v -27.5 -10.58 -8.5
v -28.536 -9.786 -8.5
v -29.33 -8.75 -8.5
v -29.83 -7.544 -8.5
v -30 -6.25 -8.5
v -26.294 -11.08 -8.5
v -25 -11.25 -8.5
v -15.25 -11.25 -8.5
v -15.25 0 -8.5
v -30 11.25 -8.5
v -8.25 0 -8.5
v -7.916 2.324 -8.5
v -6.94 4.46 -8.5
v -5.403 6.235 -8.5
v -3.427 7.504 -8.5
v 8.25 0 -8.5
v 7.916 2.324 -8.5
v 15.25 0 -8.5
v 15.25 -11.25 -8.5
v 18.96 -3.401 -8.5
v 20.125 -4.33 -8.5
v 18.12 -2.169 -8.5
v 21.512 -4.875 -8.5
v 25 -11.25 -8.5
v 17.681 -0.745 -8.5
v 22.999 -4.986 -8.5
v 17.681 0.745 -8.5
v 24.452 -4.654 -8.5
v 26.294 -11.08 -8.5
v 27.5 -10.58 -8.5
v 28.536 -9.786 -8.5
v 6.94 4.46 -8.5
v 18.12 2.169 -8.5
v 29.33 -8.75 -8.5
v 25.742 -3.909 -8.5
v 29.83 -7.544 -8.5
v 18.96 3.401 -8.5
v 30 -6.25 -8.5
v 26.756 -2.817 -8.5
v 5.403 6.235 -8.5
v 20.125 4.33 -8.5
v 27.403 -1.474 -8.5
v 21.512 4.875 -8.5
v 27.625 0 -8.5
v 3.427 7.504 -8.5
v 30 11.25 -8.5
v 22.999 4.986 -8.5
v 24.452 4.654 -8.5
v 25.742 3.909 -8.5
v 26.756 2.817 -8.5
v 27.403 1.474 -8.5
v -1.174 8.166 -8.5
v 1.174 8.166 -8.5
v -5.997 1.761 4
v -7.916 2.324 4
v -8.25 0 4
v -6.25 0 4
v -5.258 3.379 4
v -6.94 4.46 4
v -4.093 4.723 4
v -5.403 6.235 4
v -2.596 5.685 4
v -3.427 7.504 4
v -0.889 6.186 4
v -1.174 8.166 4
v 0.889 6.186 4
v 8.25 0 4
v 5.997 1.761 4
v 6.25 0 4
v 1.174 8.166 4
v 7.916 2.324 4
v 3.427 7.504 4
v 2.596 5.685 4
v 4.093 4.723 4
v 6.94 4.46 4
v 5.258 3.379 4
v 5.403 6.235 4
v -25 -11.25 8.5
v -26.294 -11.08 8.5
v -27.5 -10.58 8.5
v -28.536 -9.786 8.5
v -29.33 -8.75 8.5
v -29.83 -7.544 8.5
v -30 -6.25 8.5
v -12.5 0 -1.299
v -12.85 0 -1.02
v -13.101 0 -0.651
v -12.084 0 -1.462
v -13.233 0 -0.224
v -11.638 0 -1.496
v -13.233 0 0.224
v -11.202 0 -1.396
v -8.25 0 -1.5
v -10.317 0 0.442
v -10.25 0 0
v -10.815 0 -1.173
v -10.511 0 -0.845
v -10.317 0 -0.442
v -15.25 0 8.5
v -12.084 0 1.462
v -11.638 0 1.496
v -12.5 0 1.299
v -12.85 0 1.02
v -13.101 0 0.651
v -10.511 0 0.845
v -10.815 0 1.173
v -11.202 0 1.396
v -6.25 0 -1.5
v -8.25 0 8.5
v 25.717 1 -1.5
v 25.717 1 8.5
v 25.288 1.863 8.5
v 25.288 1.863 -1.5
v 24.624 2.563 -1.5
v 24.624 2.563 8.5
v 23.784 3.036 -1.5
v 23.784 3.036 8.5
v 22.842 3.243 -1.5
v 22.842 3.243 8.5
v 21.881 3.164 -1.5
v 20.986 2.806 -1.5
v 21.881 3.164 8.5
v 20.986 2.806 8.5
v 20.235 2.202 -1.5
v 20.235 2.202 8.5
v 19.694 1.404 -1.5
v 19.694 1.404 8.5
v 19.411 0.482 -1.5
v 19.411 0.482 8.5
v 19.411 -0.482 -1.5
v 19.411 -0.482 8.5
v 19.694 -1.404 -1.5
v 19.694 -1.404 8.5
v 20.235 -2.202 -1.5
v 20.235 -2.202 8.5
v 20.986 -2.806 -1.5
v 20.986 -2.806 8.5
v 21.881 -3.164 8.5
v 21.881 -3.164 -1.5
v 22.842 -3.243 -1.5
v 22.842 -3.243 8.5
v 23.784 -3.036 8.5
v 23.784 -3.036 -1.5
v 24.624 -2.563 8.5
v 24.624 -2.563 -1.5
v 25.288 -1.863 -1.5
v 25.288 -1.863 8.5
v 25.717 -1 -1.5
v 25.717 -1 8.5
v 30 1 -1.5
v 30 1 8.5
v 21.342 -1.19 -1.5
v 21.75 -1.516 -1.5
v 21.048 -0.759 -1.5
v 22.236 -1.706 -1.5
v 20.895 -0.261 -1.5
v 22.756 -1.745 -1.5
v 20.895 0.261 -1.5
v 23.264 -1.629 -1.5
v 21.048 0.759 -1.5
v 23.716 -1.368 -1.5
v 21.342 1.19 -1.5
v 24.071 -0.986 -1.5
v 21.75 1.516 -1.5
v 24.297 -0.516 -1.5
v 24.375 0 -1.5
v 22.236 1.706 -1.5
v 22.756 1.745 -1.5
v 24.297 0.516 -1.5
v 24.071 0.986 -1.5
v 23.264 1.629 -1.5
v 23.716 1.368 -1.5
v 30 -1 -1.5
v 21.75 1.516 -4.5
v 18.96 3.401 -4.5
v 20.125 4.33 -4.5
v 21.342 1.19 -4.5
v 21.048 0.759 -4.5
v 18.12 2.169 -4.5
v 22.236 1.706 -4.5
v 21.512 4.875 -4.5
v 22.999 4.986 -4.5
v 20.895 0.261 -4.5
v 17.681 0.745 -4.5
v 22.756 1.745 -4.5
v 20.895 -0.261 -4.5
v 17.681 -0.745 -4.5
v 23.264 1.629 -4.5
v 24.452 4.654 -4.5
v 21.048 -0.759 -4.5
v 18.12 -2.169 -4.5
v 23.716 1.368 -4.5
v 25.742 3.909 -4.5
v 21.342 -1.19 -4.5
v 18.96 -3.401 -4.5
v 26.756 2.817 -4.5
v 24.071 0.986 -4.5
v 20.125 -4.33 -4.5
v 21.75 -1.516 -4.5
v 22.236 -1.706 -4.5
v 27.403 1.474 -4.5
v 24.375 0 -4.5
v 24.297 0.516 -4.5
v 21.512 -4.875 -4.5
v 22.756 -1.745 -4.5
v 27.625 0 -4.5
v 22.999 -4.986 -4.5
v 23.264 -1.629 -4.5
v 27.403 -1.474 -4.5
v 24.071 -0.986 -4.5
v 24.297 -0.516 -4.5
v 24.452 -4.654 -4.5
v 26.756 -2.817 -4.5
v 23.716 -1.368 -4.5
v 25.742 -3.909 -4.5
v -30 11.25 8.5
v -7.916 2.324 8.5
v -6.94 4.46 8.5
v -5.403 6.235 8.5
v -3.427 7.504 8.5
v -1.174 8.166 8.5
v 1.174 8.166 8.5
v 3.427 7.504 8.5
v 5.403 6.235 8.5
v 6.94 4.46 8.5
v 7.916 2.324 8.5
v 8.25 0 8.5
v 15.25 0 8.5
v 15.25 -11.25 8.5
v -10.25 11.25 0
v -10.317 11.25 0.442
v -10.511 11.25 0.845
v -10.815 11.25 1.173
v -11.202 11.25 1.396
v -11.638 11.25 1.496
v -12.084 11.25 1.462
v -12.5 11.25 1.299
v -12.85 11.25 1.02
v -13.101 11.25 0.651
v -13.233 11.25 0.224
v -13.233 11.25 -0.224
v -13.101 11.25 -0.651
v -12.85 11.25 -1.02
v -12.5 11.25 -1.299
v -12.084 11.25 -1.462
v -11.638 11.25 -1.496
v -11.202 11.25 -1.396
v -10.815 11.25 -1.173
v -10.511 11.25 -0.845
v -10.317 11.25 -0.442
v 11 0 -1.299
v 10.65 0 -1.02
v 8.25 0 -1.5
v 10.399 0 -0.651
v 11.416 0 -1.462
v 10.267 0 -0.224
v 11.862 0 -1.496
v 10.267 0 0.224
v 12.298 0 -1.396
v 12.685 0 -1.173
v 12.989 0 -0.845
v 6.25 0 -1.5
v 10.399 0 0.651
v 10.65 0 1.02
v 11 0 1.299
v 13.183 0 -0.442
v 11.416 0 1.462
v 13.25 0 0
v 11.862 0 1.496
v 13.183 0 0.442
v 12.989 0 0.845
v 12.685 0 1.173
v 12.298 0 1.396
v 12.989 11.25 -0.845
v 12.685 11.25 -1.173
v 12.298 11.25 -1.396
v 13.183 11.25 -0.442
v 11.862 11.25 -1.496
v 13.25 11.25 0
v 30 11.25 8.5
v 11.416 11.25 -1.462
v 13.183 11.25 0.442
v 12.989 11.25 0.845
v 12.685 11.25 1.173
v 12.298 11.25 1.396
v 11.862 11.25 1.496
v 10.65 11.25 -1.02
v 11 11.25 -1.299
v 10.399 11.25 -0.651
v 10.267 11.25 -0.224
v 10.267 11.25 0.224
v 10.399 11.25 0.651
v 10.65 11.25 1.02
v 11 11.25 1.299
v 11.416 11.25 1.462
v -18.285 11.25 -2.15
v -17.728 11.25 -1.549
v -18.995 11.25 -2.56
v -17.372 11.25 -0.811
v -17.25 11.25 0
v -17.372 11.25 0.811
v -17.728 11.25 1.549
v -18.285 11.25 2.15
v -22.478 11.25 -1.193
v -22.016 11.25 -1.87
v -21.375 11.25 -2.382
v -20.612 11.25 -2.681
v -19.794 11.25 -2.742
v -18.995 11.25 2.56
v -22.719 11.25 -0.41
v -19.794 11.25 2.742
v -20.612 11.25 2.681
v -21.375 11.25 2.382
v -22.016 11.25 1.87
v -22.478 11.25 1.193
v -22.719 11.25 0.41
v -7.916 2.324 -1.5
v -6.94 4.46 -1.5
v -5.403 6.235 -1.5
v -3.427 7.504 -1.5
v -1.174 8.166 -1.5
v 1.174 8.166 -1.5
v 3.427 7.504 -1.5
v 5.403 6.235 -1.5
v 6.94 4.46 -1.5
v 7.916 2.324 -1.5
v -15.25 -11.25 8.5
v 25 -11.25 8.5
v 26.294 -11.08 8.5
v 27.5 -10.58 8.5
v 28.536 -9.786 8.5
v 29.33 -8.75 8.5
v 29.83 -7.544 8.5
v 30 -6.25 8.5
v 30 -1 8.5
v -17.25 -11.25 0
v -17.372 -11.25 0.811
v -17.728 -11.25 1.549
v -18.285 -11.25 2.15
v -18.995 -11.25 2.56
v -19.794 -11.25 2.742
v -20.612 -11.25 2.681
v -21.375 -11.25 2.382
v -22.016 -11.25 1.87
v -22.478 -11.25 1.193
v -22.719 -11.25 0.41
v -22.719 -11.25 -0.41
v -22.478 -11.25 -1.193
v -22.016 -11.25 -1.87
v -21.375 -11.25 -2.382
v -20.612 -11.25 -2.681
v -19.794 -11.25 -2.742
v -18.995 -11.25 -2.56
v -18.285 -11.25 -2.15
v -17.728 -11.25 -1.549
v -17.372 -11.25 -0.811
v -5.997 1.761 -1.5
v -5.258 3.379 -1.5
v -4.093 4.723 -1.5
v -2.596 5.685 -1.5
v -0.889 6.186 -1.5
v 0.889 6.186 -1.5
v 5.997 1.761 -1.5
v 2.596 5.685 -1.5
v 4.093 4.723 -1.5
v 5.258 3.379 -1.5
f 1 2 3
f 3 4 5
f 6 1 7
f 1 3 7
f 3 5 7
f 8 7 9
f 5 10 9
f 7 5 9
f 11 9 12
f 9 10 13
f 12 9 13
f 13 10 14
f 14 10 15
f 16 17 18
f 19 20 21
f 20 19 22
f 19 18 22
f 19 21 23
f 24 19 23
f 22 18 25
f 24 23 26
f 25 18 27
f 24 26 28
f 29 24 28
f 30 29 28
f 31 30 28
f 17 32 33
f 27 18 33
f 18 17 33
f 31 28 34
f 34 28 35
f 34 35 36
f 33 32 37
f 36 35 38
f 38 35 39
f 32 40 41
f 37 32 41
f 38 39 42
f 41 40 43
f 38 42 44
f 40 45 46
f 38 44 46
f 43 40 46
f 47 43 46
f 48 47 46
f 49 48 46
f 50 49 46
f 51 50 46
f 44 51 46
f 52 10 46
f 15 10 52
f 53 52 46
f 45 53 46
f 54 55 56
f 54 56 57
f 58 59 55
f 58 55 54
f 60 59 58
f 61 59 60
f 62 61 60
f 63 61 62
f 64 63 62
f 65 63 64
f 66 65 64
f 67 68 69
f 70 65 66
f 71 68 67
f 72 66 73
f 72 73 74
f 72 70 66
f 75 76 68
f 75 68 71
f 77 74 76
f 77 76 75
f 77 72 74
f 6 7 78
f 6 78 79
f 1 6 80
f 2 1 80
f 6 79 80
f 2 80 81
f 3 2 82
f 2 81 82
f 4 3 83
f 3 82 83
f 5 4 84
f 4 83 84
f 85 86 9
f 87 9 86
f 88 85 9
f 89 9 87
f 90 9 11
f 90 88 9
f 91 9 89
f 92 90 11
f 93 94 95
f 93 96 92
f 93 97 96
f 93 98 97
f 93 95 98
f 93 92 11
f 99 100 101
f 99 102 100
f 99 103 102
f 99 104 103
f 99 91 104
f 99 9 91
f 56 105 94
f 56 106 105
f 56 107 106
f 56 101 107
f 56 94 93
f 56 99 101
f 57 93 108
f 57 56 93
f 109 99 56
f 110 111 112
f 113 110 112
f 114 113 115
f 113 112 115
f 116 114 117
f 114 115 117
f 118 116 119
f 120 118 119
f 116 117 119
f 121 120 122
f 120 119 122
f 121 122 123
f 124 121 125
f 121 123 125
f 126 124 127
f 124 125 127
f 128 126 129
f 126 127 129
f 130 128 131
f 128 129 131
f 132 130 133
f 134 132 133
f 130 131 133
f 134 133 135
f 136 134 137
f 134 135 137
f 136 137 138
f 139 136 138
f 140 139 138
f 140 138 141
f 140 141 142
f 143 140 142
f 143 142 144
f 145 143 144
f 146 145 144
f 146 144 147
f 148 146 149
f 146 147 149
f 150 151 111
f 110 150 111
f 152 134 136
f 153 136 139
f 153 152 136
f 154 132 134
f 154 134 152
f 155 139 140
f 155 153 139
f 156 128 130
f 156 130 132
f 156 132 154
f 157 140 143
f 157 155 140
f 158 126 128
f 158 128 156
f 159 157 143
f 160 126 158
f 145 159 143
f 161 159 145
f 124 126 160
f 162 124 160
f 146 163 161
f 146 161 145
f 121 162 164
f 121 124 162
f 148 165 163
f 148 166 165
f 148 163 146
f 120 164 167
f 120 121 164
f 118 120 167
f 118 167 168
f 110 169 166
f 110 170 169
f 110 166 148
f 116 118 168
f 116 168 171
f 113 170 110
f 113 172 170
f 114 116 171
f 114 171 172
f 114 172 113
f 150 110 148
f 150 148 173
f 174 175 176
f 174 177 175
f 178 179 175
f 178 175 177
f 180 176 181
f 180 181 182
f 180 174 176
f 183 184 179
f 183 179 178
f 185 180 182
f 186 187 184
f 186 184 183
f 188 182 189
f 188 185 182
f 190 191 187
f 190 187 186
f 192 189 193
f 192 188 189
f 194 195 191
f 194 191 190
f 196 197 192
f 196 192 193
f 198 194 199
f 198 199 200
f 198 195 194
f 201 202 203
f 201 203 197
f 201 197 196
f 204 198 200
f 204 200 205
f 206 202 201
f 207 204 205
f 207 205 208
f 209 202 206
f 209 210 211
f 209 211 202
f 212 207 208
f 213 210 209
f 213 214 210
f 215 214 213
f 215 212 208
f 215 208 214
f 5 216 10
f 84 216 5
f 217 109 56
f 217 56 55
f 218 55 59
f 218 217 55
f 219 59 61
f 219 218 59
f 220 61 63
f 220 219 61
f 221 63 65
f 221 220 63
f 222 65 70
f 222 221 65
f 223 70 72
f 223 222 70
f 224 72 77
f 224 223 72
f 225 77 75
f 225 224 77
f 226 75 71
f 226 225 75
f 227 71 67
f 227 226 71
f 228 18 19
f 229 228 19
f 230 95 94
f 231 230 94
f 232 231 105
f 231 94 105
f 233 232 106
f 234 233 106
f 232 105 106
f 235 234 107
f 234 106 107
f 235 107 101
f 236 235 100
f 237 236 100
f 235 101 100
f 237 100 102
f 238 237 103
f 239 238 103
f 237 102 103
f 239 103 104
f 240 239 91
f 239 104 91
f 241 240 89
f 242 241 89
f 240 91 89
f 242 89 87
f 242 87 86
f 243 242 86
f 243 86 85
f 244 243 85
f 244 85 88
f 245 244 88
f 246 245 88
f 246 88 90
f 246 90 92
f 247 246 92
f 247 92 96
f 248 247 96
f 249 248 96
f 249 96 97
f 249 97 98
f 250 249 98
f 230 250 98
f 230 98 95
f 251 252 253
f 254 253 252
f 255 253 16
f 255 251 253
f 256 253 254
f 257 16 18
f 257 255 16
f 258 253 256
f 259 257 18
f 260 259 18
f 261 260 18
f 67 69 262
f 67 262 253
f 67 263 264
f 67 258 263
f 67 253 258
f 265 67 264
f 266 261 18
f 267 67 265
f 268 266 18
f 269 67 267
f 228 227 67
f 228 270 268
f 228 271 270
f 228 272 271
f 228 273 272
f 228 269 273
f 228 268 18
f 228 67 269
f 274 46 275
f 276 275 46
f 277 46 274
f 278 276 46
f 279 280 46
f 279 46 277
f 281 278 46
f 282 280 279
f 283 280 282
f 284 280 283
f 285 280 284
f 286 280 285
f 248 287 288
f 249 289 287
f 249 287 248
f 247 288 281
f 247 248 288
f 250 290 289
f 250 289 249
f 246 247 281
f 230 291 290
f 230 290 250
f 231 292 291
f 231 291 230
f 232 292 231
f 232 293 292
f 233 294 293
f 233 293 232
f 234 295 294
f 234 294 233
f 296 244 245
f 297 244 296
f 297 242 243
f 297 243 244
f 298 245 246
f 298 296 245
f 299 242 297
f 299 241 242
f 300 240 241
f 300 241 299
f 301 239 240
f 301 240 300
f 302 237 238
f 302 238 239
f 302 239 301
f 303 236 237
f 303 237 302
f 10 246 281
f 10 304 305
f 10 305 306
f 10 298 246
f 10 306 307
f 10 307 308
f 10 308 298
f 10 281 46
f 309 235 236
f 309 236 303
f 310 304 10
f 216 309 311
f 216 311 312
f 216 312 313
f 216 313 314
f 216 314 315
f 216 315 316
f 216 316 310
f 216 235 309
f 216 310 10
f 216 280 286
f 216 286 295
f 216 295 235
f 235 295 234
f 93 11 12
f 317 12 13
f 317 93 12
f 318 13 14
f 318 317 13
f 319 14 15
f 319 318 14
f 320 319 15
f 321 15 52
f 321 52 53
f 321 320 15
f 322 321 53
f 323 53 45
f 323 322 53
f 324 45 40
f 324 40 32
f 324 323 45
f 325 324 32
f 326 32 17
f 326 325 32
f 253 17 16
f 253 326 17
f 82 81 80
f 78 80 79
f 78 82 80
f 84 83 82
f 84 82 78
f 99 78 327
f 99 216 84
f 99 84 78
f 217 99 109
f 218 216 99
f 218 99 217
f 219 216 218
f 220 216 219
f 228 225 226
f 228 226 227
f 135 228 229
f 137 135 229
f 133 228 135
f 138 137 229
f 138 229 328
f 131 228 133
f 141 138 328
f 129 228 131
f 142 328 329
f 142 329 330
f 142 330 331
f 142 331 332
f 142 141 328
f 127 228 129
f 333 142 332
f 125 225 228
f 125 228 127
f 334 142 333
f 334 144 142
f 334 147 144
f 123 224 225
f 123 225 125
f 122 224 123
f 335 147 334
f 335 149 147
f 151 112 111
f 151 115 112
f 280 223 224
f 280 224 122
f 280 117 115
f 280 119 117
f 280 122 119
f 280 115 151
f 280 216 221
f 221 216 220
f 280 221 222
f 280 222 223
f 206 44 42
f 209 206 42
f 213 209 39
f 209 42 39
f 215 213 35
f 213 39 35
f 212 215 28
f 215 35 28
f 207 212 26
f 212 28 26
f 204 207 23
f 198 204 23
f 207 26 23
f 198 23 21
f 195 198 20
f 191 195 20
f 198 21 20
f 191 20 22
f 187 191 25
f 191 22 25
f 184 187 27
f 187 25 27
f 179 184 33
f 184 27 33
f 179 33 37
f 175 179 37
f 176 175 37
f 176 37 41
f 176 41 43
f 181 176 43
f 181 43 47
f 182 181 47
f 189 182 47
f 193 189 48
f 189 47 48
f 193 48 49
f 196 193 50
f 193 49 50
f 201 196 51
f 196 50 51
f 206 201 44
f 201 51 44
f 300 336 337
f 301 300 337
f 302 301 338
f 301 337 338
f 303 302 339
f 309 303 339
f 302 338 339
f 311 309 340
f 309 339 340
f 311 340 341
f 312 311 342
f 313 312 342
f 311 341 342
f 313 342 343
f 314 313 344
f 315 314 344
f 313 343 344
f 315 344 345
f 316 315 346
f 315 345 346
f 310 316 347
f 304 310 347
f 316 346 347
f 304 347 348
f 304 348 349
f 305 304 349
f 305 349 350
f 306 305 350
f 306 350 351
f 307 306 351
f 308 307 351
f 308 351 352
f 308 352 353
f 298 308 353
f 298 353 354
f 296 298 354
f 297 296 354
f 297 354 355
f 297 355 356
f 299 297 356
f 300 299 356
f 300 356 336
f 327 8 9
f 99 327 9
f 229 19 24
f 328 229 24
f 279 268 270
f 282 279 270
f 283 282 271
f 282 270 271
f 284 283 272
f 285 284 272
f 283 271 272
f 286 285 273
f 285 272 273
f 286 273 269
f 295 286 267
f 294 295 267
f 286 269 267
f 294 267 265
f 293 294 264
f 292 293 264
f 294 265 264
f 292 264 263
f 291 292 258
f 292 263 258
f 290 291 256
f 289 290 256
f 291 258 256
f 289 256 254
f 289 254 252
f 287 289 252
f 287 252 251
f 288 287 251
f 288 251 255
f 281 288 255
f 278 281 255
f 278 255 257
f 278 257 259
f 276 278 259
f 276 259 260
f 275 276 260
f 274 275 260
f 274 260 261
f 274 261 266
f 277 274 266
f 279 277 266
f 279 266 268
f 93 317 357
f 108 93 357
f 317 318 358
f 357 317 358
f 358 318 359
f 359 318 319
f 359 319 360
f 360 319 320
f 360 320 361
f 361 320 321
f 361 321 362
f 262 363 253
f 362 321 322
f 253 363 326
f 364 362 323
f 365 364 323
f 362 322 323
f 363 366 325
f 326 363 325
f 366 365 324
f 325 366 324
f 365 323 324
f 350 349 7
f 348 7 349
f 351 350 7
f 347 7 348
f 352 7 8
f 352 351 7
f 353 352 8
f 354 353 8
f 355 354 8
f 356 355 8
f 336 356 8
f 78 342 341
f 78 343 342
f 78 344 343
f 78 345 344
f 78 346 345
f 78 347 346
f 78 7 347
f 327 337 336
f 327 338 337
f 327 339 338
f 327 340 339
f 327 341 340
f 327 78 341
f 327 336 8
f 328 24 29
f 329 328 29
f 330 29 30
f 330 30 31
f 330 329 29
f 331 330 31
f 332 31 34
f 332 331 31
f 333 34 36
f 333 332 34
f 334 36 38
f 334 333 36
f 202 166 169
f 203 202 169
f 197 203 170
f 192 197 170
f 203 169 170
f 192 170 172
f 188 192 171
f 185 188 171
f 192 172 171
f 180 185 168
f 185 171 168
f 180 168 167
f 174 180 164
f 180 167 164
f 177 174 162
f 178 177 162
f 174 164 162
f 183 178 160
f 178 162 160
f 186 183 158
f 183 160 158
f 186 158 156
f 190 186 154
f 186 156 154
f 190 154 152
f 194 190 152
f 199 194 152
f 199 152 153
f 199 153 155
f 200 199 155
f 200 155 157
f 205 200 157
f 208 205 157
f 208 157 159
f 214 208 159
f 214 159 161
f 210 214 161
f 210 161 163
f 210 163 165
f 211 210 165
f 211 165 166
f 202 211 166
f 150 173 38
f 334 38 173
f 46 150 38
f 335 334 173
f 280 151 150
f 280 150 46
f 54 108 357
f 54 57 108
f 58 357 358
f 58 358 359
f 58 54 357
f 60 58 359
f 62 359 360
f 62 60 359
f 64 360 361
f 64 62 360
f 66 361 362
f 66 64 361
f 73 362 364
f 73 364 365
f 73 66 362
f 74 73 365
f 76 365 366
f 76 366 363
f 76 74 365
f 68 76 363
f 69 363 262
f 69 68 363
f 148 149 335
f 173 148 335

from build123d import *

# Parameters (mm, degrees)
F1_DEPTH  = 8.5
F2_R      = 2.75
F3_DEPTH  = 22.501
F4_R      = 1.75
F5_DEPTH  = 17.001
F6_R      = 5
F7_DEPTH  = 4
F8_R      = 1.5
F9_DEPTH  = 11.251
F10_R     = 5
F12_DEPTH = 10
F15_DEPTH = 2.75


with BuildPart() as f1:
    # F0 (on Top) → F1 (new body, symmetric)
    with BuildSketch(Plane.XY):
        with BuildLine():
            ThreePointArc((-8.25, 0), (0, 8.25), (8.25, 0))
            Line((8.25, 0), (15.25, 0))
            Line((15.25, 0), (15.25, -11.25))
            Line((15.25, -11.25), (30, -11.25))
            Line((30, -11.25), (30, 11.25))
            Line((30, 11.25), (0, 11.25))
            Line((0, 11.25), (-30, 11.25))
            Line((-30, 11.25), (-30, 0))
            Line((-30, 0), (-30, -11.25))
            Line((-30, -11.25), (-15.25, -11.25))
            Line((-15.25, -11.25), (-15.25, 0))
            Line((-15.25, 0), (-8.25, 0))
        make_face()
    extrude(amount=F1_DEPTH, both=True)

    # F2 (on face) → F3 (cut, through all)
    with BuildSketch(Plane.XZ.offset(11.25)):
        with Locations((-20, 0)):
            Circle(F2_R)
    extrude(amount=-F3_DEPTH, mode=Mode.SUBTRACT)

    # F4 (on face) → F5 (cut, through all)
    with BuildSketch(Plane.XY.offset(8.5)):
        with Locations((22.625, 0)):
            Circle(F4_R)
    extrude(amount=-F5_DEPTH, mode=Mode.SUBTRACT)

    # F6 (on face) → F7 (cut)
    with BuildSketch(Plane(origin=(0, 0, -8.5), x_dir=(1, 0, 0), z_dir=(0, 0, -1))):
        with Locations((22.625, 0)):
            Circle(F6_R)
    extrude(amount=-F7_DEPTH, mode=Mode.SUBTRACT)

    # F8 (on face) → F9 (cut, through all)
    with BuildSketch(Plane.XZ):
        with Locations((-11.75, 0)):
            Circle(F8_R)
        with Locations((11.75, 0)):
            Circle(F8_R)
    extrude(amount=-F9_DEPTH, mode=Mode.SUBTRACT)

    # F10
    f10_edges = [f1.edges().sort_by_distance(p)[0] for p in [
        (-30, -11.25, 0),
        (30, -11.25, 0),
    ]]
    fillet(f10_edges, radius=F10_R)

    # F11 (on face) → F12 (cut)
    with BuildSketch(Plane.XY.offset(8.5)):
        with BuildLine():
            Line((30, 1), (25.7173292192, 1))
            ThreePointArc((25.7173292192, 1), (19.375, 0), (25.7173292192, -1))
            Line((25.7173292192, -1), (30, -1))
            Line((30, -1), (30, 0))
            Line((30, 0), (30, 1))
        make_face()
    extrude(amount=-F12_DEPTH, mode=Mode.SUBTRACT)

    # F14 (on offset) → F15 (join, symmetric)
    with BuildSketch(Plane.XY.offset(1.25)):
        with BuildLine():
            Line((6.25, 0), (9, 0))
            ThreePointArc((9, 0), (0, 9), (-9, 0))
            Line((-9, 0), (-6.25, 0))
            ThreePointArc((-6.25, 0), (0, 6.25), (6.25, 0))
        make_face()
    extrude(amount=F15_DEPTH, both=True)


solid = f1.part
